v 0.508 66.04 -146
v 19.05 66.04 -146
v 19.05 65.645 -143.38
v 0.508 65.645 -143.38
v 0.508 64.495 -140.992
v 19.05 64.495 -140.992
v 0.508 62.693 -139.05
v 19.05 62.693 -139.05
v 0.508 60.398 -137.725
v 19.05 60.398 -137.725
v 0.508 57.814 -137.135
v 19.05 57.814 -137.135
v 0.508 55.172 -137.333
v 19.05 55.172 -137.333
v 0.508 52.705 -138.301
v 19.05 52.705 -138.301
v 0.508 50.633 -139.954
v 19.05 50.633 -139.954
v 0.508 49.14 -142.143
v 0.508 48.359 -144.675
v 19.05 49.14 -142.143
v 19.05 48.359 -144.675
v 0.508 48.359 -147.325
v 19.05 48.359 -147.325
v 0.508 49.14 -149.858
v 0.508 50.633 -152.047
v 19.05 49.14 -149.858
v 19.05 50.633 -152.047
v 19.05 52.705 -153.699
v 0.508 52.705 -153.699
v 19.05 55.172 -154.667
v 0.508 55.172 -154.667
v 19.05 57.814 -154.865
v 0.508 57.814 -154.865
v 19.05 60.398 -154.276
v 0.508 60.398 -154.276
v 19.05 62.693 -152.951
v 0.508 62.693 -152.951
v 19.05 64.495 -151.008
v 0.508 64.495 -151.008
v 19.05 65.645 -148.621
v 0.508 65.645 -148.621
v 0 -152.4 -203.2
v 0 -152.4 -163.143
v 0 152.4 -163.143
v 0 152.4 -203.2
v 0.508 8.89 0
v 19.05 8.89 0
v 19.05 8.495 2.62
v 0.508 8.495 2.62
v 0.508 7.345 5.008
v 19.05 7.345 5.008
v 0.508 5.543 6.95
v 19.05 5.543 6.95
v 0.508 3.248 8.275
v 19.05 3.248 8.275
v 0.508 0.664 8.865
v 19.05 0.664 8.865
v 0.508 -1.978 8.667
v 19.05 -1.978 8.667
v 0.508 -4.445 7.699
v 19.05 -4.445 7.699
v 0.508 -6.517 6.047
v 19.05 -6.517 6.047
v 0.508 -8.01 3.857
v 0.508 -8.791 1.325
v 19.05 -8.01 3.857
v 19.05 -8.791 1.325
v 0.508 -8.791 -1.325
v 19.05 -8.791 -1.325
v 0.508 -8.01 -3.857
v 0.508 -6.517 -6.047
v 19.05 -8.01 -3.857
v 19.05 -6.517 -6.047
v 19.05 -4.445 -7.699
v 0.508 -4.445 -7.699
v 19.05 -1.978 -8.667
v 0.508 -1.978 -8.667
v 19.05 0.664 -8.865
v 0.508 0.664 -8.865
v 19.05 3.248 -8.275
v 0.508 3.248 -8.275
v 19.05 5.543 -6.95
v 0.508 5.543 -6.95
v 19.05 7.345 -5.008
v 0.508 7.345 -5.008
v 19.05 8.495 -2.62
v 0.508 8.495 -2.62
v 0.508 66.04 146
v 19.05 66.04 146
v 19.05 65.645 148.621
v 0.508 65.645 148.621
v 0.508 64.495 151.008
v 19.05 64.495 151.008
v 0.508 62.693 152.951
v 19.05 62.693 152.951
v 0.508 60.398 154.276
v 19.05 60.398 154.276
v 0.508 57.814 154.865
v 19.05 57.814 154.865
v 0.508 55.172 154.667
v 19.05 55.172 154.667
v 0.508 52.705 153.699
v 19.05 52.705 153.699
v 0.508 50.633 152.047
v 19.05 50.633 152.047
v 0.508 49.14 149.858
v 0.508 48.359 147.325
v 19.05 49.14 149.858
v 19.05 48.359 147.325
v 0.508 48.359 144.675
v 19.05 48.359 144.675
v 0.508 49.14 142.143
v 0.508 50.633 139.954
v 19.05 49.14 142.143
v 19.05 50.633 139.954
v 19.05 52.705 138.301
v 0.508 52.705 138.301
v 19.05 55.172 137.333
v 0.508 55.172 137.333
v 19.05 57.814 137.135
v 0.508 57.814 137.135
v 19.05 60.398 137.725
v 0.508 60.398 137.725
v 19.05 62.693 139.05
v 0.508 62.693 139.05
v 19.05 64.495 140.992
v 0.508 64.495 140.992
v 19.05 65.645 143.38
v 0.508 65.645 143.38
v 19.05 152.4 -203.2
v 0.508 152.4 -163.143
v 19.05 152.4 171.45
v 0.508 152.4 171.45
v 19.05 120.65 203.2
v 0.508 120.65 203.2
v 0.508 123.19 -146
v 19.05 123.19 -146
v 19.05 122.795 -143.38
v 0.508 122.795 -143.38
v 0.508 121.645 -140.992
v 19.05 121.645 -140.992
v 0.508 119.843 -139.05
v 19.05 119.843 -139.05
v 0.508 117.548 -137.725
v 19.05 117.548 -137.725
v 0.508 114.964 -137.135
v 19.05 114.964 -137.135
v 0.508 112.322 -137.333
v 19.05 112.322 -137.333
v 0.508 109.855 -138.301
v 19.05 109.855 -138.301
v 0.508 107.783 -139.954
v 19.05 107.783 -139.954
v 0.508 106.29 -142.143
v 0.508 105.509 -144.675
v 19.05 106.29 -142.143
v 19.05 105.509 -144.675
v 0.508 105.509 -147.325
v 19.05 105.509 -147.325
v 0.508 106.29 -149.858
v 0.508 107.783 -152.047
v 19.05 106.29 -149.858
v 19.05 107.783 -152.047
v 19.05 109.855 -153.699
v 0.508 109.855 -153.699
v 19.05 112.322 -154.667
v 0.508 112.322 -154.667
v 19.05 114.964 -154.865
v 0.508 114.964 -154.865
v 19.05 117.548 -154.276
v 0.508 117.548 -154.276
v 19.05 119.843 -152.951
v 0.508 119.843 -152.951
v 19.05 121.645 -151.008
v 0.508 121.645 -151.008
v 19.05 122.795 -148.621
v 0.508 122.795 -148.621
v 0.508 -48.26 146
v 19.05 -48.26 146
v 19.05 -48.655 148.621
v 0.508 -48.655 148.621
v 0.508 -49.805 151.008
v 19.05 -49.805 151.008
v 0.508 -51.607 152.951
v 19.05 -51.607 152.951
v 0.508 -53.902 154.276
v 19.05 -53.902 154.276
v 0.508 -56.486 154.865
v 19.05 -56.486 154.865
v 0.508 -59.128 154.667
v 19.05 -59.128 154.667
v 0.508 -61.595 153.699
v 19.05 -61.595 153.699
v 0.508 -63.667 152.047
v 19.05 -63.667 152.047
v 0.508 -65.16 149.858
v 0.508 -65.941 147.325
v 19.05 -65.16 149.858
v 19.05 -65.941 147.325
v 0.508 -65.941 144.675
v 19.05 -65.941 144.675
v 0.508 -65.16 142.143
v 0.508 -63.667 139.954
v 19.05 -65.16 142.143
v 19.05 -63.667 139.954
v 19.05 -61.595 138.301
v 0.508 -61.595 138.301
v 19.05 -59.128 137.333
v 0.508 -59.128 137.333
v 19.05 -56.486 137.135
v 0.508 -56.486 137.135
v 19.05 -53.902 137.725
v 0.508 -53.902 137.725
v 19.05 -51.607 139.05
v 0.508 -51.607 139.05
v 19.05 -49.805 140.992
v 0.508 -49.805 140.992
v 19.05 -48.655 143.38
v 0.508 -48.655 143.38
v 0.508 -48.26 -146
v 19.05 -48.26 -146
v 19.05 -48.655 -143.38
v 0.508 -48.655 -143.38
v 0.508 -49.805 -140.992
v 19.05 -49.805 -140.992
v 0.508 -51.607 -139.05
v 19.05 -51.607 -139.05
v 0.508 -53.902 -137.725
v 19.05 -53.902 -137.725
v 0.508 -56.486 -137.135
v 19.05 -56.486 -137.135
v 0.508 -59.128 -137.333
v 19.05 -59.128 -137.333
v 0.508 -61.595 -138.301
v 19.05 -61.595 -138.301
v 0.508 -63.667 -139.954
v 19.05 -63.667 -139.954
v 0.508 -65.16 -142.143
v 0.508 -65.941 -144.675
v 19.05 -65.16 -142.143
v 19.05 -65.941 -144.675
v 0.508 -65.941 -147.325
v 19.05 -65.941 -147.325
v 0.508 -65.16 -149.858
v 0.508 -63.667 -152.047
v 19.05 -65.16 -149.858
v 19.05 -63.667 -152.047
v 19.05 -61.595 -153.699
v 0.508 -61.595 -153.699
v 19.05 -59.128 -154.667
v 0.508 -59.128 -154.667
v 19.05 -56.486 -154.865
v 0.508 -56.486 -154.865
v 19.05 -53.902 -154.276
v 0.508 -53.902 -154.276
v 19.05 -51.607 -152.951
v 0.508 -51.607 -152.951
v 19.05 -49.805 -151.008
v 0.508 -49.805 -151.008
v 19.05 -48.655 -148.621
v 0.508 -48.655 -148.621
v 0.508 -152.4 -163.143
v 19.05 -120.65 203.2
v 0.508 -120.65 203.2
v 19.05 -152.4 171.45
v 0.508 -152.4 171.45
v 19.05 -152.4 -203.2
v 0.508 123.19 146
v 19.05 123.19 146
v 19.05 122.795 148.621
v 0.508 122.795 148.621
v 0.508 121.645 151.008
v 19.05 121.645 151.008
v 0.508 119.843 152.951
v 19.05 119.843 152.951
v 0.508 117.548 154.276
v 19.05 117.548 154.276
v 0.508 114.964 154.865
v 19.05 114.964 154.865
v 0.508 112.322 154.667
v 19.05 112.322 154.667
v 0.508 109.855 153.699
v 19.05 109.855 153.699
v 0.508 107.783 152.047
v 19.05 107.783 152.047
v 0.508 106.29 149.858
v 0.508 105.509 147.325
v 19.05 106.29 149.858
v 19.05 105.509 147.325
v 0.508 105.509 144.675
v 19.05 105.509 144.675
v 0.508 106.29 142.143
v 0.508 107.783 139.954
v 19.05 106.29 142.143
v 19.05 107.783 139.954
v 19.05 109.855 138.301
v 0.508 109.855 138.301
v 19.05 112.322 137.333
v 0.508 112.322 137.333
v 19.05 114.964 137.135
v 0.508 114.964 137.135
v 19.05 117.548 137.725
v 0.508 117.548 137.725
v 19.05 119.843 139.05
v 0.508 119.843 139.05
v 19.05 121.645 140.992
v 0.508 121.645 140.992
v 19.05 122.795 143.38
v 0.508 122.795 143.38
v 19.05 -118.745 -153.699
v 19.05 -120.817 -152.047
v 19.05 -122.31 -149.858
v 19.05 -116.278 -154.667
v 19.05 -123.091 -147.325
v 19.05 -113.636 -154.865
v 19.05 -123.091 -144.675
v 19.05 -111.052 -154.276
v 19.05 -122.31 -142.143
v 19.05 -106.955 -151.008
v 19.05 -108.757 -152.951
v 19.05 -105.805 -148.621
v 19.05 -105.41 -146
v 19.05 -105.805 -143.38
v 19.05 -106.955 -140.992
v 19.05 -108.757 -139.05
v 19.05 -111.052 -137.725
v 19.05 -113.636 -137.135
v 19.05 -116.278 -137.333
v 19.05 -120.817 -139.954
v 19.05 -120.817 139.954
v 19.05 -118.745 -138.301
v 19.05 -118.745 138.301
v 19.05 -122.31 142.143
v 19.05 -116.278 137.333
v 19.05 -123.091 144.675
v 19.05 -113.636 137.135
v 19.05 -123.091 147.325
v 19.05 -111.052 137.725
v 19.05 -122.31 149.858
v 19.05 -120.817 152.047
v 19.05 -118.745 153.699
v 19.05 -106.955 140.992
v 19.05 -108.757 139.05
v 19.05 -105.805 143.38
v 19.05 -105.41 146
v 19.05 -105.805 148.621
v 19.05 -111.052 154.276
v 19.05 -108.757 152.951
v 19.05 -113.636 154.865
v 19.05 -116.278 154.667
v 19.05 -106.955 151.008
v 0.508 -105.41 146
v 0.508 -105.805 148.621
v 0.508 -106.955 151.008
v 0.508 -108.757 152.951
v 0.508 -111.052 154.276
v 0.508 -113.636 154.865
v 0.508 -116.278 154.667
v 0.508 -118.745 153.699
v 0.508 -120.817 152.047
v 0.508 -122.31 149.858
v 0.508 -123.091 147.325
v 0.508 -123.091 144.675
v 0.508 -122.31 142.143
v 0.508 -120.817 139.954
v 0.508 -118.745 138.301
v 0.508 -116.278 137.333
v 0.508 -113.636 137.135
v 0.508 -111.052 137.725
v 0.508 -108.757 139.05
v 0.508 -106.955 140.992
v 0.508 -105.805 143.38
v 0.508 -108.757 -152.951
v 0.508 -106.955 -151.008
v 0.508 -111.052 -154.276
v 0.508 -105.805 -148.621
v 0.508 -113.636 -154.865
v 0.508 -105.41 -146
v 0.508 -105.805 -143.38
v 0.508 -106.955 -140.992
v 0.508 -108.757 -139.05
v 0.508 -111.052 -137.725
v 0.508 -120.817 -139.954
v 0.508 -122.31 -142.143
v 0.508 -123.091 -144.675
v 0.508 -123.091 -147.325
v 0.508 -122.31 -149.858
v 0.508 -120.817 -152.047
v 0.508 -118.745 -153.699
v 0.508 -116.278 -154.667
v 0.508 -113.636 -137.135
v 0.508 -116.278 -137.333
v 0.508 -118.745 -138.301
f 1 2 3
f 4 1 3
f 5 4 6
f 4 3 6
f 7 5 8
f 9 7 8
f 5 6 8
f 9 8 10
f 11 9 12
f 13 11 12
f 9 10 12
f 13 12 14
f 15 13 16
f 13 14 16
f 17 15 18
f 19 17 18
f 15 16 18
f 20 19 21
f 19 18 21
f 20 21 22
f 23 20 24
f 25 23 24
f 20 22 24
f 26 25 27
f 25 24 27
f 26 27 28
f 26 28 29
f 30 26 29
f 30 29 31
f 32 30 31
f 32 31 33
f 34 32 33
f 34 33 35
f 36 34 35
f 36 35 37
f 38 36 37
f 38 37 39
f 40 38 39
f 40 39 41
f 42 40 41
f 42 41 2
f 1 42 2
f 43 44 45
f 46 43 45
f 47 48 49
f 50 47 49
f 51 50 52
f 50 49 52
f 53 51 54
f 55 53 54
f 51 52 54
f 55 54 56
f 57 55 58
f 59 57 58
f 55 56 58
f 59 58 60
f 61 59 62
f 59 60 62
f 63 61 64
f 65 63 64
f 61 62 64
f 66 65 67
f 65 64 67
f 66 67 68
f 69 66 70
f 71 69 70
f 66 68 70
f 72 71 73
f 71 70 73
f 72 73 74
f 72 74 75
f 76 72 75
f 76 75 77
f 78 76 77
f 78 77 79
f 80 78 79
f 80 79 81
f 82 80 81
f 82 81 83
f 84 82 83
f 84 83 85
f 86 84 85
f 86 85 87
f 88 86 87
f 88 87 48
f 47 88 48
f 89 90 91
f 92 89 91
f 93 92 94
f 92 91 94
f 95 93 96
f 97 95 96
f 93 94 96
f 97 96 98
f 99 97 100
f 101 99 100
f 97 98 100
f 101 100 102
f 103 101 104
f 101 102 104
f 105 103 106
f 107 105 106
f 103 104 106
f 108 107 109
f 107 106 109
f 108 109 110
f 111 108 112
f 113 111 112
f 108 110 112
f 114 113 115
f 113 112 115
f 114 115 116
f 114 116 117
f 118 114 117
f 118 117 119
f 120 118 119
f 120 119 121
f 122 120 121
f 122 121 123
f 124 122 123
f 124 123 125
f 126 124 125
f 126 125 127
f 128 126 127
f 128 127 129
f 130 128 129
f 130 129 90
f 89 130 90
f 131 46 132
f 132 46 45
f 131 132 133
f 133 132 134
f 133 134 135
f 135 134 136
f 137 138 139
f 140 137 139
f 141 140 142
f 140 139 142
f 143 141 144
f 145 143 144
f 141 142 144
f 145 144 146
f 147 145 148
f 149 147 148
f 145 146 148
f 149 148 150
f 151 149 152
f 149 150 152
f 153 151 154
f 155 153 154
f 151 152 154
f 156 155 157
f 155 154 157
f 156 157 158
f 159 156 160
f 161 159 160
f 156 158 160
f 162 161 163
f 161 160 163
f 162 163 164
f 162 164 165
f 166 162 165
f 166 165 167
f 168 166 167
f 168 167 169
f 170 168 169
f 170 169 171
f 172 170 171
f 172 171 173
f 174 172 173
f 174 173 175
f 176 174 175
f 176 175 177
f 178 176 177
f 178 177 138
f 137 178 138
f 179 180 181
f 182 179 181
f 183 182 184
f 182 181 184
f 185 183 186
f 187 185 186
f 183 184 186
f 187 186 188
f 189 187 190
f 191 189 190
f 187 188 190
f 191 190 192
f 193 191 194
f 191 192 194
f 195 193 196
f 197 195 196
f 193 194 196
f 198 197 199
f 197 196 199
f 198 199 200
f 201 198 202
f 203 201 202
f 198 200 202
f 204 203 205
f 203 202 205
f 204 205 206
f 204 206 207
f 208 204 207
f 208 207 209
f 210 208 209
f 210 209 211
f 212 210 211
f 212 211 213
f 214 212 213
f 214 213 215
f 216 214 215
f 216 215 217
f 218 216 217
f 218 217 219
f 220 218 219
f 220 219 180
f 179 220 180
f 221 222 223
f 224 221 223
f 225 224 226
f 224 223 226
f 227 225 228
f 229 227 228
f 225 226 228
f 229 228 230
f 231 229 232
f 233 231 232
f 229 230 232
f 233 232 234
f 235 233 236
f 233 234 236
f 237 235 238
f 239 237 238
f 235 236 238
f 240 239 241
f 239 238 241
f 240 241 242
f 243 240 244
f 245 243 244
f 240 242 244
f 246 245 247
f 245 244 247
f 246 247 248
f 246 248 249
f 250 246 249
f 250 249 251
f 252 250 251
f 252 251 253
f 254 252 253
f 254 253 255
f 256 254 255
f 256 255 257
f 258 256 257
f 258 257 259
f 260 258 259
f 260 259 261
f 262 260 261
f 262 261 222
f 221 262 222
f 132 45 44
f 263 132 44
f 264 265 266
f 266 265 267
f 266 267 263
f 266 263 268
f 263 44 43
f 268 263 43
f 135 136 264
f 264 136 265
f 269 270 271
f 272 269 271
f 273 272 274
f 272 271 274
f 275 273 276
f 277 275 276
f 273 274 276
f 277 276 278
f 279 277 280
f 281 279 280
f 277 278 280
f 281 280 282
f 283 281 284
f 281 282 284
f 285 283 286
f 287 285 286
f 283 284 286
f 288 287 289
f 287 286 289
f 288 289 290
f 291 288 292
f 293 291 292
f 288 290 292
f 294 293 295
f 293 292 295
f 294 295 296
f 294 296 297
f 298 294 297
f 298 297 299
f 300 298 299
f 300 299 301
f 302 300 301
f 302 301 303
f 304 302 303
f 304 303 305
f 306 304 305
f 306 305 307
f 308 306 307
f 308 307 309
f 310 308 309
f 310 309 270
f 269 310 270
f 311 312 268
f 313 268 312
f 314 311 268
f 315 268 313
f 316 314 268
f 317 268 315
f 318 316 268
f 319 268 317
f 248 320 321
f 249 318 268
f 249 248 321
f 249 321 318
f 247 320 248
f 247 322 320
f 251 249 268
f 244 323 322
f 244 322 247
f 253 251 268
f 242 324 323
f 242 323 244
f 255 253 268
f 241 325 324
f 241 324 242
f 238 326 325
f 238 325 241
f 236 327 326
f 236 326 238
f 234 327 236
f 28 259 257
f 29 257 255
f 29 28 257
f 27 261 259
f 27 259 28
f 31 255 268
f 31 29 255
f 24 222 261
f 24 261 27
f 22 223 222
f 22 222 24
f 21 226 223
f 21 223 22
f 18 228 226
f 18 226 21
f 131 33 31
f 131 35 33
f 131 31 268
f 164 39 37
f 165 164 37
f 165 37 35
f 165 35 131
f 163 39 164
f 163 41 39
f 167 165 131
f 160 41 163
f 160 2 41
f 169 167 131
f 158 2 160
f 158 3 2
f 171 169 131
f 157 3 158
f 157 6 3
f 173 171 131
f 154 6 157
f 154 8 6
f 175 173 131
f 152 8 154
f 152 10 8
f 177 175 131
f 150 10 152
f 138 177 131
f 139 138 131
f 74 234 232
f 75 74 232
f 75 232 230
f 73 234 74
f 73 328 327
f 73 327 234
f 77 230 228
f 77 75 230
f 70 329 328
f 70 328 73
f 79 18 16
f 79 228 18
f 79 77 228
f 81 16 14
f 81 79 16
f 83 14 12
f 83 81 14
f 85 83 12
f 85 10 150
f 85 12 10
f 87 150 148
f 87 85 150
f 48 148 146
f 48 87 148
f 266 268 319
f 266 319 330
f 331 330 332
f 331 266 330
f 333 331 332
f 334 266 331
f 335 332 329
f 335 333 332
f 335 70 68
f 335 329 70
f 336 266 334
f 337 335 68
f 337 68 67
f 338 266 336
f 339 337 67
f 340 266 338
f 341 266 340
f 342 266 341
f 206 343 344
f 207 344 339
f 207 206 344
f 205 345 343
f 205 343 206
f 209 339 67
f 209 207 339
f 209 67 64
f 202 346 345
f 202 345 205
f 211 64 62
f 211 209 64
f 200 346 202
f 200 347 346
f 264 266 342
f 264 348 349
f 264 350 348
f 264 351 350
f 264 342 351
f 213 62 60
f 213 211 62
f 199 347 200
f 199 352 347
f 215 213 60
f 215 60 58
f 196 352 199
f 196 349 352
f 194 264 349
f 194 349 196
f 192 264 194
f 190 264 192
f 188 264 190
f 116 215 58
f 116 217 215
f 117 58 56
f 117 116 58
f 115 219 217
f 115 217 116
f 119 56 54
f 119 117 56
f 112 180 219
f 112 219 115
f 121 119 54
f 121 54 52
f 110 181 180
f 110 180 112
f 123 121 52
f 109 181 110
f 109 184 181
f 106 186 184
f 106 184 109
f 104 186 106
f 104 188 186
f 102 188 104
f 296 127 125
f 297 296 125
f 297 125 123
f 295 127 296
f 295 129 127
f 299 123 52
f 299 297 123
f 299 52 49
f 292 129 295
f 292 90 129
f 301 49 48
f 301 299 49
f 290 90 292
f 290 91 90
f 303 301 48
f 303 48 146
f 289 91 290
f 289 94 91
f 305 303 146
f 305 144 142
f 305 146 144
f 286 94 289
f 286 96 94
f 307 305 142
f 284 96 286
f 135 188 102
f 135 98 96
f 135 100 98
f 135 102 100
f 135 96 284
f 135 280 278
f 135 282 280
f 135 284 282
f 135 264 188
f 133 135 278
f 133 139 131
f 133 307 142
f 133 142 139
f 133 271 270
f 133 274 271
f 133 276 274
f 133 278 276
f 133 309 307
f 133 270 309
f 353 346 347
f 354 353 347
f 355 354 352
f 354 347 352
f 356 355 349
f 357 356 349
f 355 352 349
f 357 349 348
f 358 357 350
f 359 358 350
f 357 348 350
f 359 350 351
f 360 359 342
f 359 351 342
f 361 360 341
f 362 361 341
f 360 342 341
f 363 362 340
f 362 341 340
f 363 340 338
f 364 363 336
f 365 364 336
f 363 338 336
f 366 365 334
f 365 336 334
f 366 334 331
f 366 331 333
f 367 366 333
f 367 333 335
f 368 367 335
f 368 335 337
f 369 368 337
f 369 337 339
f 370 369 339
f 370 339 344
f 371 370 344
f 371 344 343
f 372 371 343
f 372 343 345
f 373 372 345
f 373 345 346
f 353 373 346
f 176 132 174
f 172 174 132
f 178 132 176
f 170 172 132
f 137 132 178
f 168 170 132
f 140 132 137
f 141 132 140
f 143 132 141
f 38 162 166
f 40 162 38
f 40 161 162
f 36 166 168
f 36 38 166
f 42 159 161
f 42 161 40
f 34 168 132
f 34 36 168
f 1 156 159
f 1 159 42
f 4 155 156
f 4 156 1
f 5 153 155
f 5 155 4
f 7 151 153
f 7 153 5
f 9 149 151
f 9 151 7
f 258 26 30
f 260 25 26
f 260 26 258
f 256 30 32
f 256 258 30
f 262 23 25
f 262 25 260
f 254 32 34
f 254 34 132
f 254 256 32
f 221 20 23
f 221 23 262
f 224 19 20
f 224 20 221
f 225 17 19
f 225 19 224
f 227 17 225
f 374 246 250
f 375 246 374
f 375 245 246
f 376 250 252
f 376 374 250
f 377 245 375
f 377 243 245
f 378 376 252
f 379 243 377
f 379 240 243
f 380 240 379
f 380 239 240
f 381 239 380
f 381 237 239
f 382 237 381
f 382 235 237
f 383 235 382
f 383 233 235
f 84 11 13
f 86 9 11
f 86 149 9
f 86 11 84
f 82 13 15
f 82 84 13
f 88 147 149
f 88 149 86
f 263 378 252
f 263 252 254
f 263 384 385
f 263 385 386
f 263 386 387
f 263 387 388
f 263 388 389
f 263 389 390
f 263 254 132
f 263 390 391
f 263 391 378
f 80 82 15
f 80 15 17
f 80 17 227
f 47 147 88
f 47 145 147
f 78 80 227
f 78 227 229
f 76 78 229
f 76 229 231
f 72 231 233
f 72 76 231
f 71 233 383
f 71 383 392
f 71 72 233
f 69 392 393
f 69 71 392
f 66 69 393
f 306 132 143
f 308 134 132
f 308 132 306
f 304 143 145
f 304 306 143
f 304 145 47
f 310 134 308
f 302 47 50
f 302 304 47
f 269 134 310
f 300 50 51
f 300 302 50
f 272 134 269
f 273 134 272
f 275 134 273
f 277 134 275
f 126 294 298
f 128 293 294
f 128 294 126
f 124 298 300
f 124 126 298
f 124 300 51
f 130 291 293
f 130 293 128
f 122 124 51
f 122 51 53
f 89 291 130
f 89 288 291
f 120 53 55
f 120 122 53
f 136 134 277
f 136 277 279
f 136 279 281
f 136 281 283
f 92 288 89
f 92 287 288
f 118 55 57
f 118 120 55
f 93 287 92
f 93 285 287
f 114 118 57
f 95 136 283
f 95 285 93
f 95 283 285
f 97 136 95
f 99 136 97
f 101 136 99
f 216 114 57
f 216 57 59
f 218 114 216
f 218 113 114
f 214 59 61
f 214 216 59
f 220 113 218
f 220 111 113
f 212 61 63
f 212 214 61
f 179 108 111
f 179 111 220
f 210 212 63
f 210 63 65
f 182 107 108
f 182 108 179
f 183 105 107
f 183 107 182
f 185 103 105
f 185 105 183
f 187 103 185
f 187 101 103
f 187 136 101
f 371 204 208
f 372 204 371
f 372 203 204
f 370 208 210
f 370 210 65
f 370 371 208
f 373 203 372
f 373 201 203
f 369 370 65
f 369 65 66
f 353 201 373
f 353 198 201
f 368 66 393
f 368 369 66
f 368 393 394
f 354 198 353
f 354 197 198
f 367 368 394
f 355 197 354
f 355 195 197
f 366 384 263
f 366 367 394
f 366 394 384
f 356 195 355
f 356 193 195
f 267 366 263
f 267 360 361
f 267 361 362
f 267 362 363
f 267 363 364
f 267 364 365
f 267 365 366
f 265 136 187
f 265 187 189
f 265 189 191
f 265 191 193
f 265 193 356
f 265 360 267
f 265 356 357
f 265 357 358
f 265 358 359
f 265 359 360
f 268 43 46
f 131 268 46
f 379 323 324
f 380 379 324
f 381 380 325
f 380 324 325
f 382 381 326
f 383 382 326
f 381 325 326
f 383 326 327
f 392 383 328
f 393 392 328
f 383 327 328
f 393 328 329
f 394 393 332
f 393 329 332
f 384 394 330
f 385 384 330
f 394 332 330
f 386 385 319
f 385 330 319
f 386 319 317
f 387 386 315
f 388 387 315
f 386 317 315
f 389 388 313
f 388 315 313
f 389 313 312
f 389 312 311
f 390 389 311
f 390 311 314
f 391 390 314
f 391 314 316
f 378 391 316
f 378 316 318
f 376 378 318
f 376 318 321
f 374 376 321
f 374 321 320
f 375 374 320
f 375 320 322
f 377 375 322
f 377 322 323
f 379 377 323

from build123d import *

# Parameters (mm, degrees)
F1_DEPTH = 19.05
F2_R     = 8.89
F3_DEPTH = 96.012
F4_W     = 304.8
F4_H     = 366.342949
F5_DEPTH = 0.508


with BuildPart() as f1:
    # F0 (on Right) → F1 (new body)
    with BuildSketch(Plane.YZ):
        Polygon((-152.4, -203.2), (152.4, -203.2), (152.4, 171.45), (120.65, 203.2), (-120.65, 203.2), (-152.4, 171.45), align=None)
    extrude(amount=F1_DEPTH)

    # F2 (on face) → F3 (cut)
    with BuildSketch(Plane.YZ.offset(19.05)):
        with Locations((-57.15, 146.000296)):
            Circle(F2_R)
        with Locations((-114.3, 146.000296)):
            Circle(F2_R)
        Circle(F2_R)
        with Locations((-57.15, -146.000296)):
            Circle(F2_R)
        with Locations((-114.3, -146.000296)):
            Circle(F2_R)
        with Locations((57.15, 146.000296)):
            Circle(F2_R)
        with Locations((114.3, 146.000296)):
            Circle(F2_R)
        with Locations((57.15, -146.000296)):
            Circle(F2_R)
        with Locations((114.3, -146.000296)):
            Circle(F2_R)
    extrude(amount=-F3_DEPTH, mode=Mode.SUBTRACT)

    # F4 (on face) → F5 (cut)
    with BuildSketch(Plane(origin=(0, 0, 0), x_dir=(0, -1, 0), z_dir=(-1, 0, 0))):
        with Locations((0, 20.028526)):
            Rectangle(F4_W, F4_H)
    extrude(amount=-F5_DEPTH, mode=Mode.SUBTRACT)


solid = f1.part
